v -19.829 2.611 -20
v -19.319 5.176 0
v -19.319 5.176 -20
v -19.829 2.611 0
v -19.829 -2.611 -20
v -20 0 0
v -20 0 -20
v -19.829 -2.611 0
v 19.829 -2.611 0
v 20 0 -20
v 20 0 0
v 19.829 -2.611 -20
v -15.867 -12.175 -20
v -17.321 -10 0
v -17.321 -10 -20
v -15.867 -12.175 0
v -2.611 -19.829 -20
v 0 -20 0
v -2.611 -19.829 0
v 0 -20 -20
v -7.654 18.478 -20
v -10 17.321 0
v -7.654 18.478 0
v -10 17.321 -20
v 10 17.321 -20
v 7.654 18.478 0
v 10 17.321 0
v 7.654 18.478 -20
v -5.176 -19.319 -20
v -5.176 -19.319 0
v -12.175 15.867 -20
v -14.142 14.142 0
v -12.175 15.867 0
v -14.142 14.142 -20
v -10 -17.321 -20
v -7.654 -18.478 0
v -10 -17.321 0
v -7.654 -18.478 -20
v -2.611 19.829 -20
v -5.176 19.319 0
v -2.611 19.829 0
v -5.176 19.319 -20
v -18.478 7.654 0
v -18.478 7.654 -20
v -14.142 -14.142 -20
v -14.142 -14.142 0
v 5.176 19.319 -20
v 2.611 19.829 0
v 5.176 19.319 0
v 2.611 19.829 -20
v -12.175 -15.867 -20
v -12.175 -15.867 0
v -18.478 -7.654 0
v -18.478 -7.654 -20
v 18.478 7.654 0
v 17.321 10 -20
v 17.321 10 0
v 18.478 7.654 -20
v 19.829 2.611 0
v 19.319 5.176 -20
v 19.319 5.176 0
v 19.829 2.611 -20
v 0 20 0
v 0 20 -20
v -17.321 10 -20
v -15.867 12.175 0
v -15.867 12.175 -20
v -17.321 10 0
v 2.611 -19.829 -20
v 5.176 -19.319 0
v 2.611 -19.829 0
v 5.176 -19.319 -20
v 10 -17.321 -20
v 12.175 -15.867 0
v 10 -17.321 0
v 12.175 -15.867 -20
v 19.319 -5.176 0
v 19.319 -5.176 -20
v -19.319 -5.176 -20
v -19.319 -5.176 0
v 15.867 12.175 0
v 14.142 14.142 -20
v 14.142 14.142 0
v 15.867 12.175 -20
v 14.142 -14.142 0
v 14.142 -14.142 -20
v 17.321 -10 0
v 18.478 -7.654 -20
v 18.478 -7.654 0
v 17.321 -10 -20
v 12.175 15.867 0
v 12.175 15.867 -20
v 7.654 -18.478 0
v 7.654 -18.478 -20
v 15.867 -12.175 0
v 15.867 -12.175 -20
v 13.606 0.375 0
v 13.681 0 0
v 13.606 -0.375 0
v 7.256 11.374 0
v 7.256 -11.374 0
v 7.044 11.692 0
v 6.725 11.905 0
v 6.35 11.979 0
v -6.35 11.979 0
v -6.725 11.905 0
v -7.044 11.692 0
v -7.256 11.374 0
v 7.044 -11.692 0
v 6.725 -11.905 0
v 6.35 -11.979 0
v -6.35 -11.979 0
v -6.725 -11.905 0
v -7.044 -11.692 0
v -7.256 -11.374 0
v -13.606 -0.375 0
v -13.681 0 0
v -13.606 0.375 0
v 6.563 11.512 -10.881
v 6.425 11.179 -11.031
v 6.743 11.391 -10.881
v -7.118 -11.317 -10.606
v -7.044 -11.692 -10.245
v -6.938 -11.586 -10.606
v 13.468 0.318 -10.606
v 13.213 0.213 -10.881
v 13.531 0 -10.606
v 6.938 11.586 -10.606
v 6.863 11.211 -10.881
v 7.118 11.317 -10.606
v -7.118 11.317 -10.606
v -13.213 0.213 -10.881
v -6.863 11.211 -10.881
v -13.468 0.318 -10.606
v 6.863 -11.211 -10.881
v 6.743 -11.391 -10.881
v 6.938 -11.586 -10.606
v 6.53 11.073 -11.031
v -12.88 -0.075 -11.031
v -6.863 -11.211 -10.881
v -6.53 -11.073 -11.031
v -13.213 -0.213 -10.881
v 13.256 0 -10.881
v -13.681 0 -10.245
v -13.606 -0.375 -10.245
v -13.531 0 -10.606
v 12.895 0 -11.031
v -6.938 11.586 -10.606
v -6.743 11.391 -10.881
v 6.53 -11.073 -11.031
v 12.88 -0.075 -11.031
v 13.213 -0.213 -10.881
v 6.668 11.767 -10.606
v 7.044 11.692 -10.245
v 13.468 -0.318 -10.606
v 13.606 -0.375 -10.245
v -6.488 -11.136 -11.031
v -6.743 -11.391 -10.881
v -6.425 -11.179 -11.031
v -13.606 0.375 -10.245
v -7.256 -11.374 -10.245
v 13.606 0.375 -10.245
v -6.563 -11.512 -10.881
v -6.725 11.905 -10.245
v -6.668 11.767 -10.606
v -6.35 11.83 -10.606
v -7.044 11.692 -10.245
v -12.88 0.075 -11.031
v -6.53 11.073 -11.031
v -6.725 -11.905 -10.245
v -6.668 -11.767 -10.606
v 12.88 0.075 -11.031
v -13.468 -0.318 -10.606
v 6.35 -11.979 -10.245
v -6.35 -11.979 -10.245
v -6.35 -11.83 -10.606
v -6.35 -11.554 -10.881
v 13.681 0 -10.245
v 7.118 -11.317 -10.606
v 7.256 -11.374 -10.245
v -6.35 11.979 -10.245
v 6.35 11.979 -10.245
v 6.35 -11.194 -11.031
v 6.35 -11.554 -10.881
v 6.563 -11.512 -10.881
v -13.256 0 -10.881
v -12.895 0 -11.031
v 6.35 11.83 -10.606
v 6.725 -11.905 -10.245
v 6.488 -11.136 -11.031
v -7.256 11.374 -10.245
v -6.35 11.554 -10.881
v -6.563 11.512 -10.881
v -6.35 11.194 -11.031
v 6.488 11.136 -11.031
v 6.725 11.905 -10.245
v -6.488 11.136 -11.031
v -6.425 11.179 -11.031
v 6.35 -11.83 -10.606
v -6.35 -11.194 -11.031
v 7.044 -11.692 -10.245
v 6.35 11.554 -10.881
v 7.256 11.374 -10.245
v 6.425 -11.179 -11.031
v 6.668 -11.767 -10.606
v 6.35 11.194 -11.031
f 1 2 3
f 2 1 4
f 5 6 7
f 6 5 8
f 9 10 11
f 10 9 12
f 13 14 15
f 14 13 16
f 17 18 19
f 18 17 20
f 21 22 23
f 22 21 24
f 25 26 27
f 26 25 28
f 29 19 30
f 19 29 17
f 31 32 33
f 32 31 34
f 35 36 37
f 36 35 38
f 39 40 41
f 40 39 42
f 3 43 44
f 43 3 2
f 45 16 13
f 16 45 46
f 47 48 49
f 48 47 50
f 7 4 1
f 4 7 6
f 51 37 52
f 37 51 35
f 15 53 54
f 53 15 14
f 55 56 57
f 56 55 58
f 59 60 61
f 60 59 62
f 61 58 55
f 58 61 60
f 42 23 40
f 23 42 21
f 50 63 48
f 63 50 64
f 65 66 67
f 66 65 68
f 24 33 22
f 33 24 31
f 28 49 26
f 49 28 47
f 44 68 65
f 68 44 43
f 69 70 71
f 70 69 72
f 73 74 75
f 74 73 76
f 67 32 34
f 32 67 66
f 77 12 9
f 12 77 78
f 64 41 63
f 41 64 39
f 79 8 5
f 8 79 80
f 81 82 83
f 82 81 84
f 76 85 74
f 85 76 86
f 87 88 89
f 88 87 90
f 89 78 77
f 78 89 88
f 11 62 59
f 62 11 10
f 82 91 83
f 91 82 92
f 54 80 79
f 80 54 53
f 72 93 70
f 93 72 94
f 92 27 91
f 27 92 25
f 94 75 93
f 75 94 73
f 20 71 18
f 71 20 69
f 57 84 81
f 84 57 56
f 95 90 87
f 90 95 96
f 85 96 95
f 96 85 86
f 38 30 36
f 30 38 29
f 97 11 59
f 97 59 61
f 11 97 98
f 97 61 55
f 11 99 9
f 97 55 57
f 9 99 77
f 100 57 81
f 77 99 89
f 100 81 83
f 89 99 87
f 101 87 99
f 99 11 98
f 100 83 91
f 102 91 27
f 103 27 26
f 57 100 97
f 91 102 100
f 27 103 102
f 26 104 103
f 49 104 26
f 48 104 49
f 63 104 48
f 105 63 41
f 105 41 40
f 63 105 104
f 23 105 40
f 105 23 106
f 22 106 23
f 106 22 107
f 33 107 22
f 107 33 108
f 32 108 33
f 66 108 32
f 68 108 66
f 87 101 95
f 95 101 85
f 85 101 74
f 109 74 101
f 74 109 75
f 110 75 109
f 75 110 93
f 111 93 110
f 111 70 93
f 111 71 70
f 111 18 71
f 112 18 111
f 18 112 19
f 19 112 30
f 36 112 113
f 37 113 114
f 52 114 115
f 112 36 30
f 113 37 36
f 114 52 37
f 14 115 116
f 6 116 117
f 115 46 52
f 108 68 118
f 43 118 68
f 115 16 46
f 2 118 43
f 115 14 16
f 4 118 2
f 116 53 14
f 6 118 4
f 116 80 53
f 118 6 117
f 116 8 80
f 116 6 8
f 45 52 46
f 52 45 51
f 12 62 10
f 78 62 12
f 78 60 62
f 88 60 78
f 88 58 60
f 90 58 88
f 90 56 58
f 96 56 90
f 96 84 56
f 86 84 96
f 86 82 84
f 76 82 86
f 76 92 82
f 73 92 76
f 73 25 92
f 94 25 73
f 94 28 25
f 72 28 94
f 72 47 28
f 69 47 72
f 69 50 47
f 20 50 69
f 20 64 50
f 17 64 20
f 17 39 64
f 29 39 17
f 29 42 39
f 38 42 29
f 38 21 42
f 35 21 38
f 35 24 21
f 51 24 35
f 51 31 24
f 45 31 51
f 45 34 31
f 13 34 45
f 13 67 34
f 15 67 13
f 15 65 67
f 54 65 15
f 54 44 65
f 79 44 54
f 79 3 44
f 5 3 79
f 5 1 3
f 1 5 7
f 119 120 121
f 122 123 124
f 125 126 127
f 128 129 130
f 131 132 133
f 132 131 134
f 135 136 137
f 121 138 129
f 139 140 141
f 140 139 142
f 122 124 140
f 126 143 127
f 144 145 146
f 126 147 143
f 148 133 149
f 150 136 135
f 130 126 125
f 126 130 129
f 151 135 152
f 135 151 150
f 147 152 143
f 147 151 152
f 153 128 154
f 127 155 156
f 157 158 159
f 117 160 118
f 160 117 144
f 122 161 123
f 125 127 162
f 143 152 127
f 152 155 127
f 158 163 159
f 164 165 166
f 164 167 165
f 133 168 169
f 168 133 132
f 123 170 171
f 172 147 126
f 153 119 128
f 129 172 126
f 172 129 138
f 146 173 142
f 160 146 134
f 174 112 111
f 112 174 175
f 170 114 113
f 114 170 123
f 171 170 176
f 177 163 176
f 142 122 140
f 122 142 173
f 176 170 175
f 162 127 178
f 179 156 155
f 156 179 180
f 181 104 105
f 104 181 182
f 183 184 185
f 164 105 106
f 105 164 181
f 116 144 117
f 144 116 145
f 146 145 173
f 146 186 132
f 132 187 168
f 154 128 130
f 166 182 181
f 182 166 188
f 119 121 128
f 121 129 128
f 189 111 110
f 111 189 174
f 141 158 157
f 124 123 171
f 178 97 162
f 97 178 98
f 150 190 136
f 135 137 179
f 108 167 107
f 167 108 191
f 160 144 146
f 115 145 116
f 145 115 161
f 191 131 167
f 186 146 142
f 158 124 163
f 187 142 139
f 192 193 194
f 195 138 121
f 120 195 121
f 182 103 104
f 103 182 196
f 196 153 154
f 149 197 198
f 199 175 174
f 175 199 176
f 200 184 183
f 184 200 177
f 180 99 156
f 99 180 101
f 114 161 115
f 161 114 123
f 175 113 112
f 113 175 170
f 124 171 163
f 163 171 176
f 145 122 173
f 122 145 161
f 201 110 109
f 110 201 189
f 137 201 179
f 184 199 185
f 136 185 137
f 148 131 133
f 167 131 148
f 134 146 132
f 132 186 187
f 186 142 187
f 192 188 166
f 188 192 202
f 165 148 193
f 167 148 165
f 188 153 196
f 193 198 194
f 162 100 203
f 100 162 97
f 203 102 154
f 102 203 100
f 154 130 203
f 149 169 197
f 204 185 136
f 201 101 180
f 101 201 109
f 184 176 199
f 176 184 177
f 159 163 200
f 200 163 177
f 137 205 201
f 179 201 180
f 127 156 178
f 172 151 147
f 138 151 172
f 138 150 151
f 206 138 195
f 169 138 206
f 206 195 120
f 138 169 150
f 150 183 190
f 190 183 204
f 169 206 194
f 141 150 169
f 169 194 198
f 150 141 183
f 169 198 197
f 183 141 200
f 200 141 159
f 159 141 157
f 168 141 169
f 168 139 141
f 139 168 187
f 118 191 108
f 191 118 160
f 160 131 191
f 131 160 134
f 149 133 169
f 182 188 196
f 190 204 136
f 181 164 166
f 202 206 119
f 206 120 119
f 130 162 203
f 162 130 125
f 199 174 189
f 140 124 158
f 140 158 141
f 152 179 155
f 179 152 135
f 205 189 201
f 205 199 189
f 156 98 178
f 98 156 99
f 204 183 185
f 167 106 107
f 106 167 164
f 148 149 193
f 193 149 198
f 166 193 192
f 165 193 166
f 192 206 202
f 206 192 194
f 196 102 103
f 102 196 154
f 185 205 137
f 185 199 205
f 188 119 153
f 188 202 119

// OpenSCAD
make_odm360("nut");

module make_odm360(type="top"){
    if(type=="top") {
        camera_base_top();
    }
    else if(type=="bottom"){
        camera_base_bottom();
    }
    else if(type=="nut"){
    nut_whole();
    }
}


// Define dimensions. All in mm

num_cams = 8;

edge_thickness = 4; // Thickness of the raised edge where the holes are
edge_width_from_hole = 7; // Width of the edge, material on each side of the hole
hole_diameter = 6; // bolt hole diameter
bolthead_d = 12; // bolt head countersink diameter
bolthead_h = 2; // bolt head height (for countersink depth)
radius_to_hole = 50; // Distance from center to the center of the mounting holes
downangle = 32; // Angle in degrees cameras face downward
cord_hole_length = 20;
cord_hole_width = 10;
cord_hole_offset = 20;

// Alignment indent in edge
// picam base width is 13.5
picam_base_width = 14.1375;
// picam base thickness is 11.5, optimum size is
// 12.1375, but we want to give a little space for
// bad drilling and it's better to index against
// the side
picam_base_thickness = 12.2;
indent_depth = 2;
offset_of_hole = 0; // If the mounting bolt hole isn't centered you can adjust it

// Don't touch
rotate_angle = 360/num_cams;

module picam(){
    translate([14.5,17,8.15]){
        rotate([0, 0, 90 ]){
            import("raspicam.stl", convexity=10);
        }
    }
}

module lenswcone() {
    translate([14.5,17,5.15]){
        rotate([0, 0, 90 ]){
            union(){
                // Lens
                translate([0,0,33]){
                    rotate([90,0,0])
                        {cylinder(r=22.8832/2, h=40);}
                    }

                // Cone of lens view

                translate([0,-22,33]){
                    rotate([90,0,0])
                        {cylinder(r1=0, r2=45.568/2*2, h=19.727*2);}
                    }

                }
            }
        }
}

module lens() {
    translate([14.5,17,5.15]){
        rotate([0, 0, 90 ]){
            union(){
                // Lens
                translate([0,0,33]){
                    rotate([90,0,0])
                        {cylinder(r=22.8832/2, h=36);}
                    }

                }
            }
        }
}

// Holy Cameras Batman
// Camera lens loop
module camera_lenses() {
    for (cam = [1 : num_cams]){
        rotate([0,0,cam * rotate_angle + (360/num_cams)]){
            translate([radius_to_hole, -picam_base_width/2, edge_thickness - indent_depth]){
                rotate([0, downangle, rotate_angle ]){
                    union(){
                        translate([-picam_base_thickness / 2, -picam_base_width / 2, 0]){
                            //picam();
                            lens();
                        }
                    }
                }
            }
        }
    }
}

module picams() {
    for (cam = [1 : num_cams]){
        rotate([0,0,cam * rotate_angle + (360/num_cams)]){
            translate([radius_to_hole, -picam_base_width/2, edge_thickness - indent_depth]){
                rotate([0, downangle, rotate_angle ]){
                    union(){
                        translate([-picam_base_thickness / 2, -picam_base_width / 2, 0]){
                            picam();
                            lens();
                        }
                    }
                }
            }
        }
    }
}


module camera_holeswcone() {
    for (cam = [1 : num_cams]){
        rotate([0,0,cam * rotate_angle + (360/num_cams)]){
            translate([radius_to_hole, -picam_base_width/2, edge_thickness - indent_depth]){
                rotate([0, downangle, rotate_angle ]){
                    union(){
                        translate([-picam_base_thickness / 2, -picam_base_width / 2, 0]){
                            //picam();
                            lenswcone();
                        }
                    }
                }
            }
        }
    }
}

num_sides = 36;
rotate_angle_sides = 360/num_sides;


// Camera Base
module camera_base() {
    mirror([0,1,0]){
        difference(){
            minkowski(){
                hull(){
                    for (cam = [1 : num_cams]){

                        rotate([0,0,cam * rotate_angle + (360/num_cams)]){
                            translate([radius_to_hole, -picam_base_width/2, edge_thickness - indent_depth]){
                                rotate([0, downangle, -rotate_angle]){

                                    translate([-picam_base_thickness / 2, -picam_base_width / 2, 0]){
                                        cube([picam_base_thickness, picam_base_width, indent_depth]);
                                    }

                                }
                            }
                        }
                    }
                }
                sphere(3, $fn=36);
            }
            // Camera mount holes loop
            camera_mount_holes();

        }
    }
}

module camera_mount_holes(){
    for (cam = [1 : num_cams]){

        rotate([0,0,cam * rotate_angle + (360/num_cams)]){
            translate([radius_to_hole, -picam_base_width/2, edge_thickness - indent_depth]){
                rotate([0, downangle, -rotate_angle]){
                    union(){
                        translate([-picam_base_thickness / 2, -picam_base_width / 2, 0]){
                            cube([picam_base_thickness, picam_base_width, indent_depth + 10]);
                        }
                        translate([0, 0, -(bolthead_h * 2 + 10)]){
                            cylinder(r = hole_diameter / 2, h = edge_thickness * 3 + 10, $fn = 64);
                            cylinder(r = bolthead_d / 2 + 0.1, h = bolthead_h + 10, $fn = 64);

                        }
                    }
                }
            }
        }
    }
}

module cord_holes(){
    for (cam = [1 : num_cams]){
        if(cam%2==0) {
            rotate([0,0,cam * rotate_angle + (360/num_cams) * 1.5]){
                translate([cord_hole_offset, 0, -20]){
                        minkowski(){
                            cube([cord_hole_length,cord_hole_width,100]);
                            sphere(1, $fn=16);
                        }
                }
            }
        }
    }
}



module central_post() {

    minkowski(){
        union(){
            cylinder(r1=15, r2=15, h=25, $fn=6);
            cylinder(r1=10, r2=10, h=80, $fn=36);
        }
        sphere(0.5, $fn=16);
    }
    cylinder(r=5, h=90, $fn=36);
}


module camera_hull() {
    hull(){
        camera_lenses();
        camera_base();

        translate([0,0,90]){
            rotate([0,180,45]){
                //mirror([0,1,0]){
                    //union(){
                    camera_base();
                    camera_lenses();
                    //picams();
                    //camera_base();
                    //}
                //}
            }
        }
    }
}

module cover() {
    difference(){
        translate([0,0,90]){
            rotate([0,180,45]){
                difference() {
                    minkowski() {
                        camera_hull();
                        sphere(2, $fn=36);
                    }
                    camera_hull();
                    cube([1000,1000,90],center=true);
                    translate([0,0,90]){
                        rotate([0,180,45]){
                            mirror([0,1,0]){
                                camera_base();
                                mirror([0,1,0]){camera_holeswcone();}
                                //camera_base();
                                //}
                            }
                        }
                    }
                    mirror([0,1,0]){
                        camera_holeswcone();
                    }
                }
            }
        }
        mirror([0,1,0]){camera_mount_holes();}
    }
}


module camera_base_top() {
        mirror([0,1,0]){
            cover();
        }
        rotate([0,180,0]){
            translate([0,0,-90]){
                translate([0,0,90]){
                    rotate([0,180,45]){
                        difference() {
                            mirror([0,1,0]){
                                //union(){
                                camera_base();
                                //camera_lenses();
                                //camera_base();
                                //}
                            }
                            translate([0,0,90-2]){
                                rotate([0,180,0]){
                                    central_post();
                                }
                            }
                        }
                    }
                }
            }
        }
}

module nut_hole(){
    minkowski(){
        translate([0,0,-9]){
            cylinder(r=25.4/2, h=25.4*3/4, $fn=6);
        }
        sphere(1, $fn=16);
    }
}

//includes cylinder that nut hole is in
module nut_whole(){
    rotate([0,180,0]){
        difference(){
            cylinder(r=20, h=20, $fn = 48);
            nut_hole();
        }
    }
}

module camera_base_bottom() {
    difference() {
        union(){
            central_post();
            camera_base();
            cover();
        }
        cord_holes();
        nut_hole();
    }
}
